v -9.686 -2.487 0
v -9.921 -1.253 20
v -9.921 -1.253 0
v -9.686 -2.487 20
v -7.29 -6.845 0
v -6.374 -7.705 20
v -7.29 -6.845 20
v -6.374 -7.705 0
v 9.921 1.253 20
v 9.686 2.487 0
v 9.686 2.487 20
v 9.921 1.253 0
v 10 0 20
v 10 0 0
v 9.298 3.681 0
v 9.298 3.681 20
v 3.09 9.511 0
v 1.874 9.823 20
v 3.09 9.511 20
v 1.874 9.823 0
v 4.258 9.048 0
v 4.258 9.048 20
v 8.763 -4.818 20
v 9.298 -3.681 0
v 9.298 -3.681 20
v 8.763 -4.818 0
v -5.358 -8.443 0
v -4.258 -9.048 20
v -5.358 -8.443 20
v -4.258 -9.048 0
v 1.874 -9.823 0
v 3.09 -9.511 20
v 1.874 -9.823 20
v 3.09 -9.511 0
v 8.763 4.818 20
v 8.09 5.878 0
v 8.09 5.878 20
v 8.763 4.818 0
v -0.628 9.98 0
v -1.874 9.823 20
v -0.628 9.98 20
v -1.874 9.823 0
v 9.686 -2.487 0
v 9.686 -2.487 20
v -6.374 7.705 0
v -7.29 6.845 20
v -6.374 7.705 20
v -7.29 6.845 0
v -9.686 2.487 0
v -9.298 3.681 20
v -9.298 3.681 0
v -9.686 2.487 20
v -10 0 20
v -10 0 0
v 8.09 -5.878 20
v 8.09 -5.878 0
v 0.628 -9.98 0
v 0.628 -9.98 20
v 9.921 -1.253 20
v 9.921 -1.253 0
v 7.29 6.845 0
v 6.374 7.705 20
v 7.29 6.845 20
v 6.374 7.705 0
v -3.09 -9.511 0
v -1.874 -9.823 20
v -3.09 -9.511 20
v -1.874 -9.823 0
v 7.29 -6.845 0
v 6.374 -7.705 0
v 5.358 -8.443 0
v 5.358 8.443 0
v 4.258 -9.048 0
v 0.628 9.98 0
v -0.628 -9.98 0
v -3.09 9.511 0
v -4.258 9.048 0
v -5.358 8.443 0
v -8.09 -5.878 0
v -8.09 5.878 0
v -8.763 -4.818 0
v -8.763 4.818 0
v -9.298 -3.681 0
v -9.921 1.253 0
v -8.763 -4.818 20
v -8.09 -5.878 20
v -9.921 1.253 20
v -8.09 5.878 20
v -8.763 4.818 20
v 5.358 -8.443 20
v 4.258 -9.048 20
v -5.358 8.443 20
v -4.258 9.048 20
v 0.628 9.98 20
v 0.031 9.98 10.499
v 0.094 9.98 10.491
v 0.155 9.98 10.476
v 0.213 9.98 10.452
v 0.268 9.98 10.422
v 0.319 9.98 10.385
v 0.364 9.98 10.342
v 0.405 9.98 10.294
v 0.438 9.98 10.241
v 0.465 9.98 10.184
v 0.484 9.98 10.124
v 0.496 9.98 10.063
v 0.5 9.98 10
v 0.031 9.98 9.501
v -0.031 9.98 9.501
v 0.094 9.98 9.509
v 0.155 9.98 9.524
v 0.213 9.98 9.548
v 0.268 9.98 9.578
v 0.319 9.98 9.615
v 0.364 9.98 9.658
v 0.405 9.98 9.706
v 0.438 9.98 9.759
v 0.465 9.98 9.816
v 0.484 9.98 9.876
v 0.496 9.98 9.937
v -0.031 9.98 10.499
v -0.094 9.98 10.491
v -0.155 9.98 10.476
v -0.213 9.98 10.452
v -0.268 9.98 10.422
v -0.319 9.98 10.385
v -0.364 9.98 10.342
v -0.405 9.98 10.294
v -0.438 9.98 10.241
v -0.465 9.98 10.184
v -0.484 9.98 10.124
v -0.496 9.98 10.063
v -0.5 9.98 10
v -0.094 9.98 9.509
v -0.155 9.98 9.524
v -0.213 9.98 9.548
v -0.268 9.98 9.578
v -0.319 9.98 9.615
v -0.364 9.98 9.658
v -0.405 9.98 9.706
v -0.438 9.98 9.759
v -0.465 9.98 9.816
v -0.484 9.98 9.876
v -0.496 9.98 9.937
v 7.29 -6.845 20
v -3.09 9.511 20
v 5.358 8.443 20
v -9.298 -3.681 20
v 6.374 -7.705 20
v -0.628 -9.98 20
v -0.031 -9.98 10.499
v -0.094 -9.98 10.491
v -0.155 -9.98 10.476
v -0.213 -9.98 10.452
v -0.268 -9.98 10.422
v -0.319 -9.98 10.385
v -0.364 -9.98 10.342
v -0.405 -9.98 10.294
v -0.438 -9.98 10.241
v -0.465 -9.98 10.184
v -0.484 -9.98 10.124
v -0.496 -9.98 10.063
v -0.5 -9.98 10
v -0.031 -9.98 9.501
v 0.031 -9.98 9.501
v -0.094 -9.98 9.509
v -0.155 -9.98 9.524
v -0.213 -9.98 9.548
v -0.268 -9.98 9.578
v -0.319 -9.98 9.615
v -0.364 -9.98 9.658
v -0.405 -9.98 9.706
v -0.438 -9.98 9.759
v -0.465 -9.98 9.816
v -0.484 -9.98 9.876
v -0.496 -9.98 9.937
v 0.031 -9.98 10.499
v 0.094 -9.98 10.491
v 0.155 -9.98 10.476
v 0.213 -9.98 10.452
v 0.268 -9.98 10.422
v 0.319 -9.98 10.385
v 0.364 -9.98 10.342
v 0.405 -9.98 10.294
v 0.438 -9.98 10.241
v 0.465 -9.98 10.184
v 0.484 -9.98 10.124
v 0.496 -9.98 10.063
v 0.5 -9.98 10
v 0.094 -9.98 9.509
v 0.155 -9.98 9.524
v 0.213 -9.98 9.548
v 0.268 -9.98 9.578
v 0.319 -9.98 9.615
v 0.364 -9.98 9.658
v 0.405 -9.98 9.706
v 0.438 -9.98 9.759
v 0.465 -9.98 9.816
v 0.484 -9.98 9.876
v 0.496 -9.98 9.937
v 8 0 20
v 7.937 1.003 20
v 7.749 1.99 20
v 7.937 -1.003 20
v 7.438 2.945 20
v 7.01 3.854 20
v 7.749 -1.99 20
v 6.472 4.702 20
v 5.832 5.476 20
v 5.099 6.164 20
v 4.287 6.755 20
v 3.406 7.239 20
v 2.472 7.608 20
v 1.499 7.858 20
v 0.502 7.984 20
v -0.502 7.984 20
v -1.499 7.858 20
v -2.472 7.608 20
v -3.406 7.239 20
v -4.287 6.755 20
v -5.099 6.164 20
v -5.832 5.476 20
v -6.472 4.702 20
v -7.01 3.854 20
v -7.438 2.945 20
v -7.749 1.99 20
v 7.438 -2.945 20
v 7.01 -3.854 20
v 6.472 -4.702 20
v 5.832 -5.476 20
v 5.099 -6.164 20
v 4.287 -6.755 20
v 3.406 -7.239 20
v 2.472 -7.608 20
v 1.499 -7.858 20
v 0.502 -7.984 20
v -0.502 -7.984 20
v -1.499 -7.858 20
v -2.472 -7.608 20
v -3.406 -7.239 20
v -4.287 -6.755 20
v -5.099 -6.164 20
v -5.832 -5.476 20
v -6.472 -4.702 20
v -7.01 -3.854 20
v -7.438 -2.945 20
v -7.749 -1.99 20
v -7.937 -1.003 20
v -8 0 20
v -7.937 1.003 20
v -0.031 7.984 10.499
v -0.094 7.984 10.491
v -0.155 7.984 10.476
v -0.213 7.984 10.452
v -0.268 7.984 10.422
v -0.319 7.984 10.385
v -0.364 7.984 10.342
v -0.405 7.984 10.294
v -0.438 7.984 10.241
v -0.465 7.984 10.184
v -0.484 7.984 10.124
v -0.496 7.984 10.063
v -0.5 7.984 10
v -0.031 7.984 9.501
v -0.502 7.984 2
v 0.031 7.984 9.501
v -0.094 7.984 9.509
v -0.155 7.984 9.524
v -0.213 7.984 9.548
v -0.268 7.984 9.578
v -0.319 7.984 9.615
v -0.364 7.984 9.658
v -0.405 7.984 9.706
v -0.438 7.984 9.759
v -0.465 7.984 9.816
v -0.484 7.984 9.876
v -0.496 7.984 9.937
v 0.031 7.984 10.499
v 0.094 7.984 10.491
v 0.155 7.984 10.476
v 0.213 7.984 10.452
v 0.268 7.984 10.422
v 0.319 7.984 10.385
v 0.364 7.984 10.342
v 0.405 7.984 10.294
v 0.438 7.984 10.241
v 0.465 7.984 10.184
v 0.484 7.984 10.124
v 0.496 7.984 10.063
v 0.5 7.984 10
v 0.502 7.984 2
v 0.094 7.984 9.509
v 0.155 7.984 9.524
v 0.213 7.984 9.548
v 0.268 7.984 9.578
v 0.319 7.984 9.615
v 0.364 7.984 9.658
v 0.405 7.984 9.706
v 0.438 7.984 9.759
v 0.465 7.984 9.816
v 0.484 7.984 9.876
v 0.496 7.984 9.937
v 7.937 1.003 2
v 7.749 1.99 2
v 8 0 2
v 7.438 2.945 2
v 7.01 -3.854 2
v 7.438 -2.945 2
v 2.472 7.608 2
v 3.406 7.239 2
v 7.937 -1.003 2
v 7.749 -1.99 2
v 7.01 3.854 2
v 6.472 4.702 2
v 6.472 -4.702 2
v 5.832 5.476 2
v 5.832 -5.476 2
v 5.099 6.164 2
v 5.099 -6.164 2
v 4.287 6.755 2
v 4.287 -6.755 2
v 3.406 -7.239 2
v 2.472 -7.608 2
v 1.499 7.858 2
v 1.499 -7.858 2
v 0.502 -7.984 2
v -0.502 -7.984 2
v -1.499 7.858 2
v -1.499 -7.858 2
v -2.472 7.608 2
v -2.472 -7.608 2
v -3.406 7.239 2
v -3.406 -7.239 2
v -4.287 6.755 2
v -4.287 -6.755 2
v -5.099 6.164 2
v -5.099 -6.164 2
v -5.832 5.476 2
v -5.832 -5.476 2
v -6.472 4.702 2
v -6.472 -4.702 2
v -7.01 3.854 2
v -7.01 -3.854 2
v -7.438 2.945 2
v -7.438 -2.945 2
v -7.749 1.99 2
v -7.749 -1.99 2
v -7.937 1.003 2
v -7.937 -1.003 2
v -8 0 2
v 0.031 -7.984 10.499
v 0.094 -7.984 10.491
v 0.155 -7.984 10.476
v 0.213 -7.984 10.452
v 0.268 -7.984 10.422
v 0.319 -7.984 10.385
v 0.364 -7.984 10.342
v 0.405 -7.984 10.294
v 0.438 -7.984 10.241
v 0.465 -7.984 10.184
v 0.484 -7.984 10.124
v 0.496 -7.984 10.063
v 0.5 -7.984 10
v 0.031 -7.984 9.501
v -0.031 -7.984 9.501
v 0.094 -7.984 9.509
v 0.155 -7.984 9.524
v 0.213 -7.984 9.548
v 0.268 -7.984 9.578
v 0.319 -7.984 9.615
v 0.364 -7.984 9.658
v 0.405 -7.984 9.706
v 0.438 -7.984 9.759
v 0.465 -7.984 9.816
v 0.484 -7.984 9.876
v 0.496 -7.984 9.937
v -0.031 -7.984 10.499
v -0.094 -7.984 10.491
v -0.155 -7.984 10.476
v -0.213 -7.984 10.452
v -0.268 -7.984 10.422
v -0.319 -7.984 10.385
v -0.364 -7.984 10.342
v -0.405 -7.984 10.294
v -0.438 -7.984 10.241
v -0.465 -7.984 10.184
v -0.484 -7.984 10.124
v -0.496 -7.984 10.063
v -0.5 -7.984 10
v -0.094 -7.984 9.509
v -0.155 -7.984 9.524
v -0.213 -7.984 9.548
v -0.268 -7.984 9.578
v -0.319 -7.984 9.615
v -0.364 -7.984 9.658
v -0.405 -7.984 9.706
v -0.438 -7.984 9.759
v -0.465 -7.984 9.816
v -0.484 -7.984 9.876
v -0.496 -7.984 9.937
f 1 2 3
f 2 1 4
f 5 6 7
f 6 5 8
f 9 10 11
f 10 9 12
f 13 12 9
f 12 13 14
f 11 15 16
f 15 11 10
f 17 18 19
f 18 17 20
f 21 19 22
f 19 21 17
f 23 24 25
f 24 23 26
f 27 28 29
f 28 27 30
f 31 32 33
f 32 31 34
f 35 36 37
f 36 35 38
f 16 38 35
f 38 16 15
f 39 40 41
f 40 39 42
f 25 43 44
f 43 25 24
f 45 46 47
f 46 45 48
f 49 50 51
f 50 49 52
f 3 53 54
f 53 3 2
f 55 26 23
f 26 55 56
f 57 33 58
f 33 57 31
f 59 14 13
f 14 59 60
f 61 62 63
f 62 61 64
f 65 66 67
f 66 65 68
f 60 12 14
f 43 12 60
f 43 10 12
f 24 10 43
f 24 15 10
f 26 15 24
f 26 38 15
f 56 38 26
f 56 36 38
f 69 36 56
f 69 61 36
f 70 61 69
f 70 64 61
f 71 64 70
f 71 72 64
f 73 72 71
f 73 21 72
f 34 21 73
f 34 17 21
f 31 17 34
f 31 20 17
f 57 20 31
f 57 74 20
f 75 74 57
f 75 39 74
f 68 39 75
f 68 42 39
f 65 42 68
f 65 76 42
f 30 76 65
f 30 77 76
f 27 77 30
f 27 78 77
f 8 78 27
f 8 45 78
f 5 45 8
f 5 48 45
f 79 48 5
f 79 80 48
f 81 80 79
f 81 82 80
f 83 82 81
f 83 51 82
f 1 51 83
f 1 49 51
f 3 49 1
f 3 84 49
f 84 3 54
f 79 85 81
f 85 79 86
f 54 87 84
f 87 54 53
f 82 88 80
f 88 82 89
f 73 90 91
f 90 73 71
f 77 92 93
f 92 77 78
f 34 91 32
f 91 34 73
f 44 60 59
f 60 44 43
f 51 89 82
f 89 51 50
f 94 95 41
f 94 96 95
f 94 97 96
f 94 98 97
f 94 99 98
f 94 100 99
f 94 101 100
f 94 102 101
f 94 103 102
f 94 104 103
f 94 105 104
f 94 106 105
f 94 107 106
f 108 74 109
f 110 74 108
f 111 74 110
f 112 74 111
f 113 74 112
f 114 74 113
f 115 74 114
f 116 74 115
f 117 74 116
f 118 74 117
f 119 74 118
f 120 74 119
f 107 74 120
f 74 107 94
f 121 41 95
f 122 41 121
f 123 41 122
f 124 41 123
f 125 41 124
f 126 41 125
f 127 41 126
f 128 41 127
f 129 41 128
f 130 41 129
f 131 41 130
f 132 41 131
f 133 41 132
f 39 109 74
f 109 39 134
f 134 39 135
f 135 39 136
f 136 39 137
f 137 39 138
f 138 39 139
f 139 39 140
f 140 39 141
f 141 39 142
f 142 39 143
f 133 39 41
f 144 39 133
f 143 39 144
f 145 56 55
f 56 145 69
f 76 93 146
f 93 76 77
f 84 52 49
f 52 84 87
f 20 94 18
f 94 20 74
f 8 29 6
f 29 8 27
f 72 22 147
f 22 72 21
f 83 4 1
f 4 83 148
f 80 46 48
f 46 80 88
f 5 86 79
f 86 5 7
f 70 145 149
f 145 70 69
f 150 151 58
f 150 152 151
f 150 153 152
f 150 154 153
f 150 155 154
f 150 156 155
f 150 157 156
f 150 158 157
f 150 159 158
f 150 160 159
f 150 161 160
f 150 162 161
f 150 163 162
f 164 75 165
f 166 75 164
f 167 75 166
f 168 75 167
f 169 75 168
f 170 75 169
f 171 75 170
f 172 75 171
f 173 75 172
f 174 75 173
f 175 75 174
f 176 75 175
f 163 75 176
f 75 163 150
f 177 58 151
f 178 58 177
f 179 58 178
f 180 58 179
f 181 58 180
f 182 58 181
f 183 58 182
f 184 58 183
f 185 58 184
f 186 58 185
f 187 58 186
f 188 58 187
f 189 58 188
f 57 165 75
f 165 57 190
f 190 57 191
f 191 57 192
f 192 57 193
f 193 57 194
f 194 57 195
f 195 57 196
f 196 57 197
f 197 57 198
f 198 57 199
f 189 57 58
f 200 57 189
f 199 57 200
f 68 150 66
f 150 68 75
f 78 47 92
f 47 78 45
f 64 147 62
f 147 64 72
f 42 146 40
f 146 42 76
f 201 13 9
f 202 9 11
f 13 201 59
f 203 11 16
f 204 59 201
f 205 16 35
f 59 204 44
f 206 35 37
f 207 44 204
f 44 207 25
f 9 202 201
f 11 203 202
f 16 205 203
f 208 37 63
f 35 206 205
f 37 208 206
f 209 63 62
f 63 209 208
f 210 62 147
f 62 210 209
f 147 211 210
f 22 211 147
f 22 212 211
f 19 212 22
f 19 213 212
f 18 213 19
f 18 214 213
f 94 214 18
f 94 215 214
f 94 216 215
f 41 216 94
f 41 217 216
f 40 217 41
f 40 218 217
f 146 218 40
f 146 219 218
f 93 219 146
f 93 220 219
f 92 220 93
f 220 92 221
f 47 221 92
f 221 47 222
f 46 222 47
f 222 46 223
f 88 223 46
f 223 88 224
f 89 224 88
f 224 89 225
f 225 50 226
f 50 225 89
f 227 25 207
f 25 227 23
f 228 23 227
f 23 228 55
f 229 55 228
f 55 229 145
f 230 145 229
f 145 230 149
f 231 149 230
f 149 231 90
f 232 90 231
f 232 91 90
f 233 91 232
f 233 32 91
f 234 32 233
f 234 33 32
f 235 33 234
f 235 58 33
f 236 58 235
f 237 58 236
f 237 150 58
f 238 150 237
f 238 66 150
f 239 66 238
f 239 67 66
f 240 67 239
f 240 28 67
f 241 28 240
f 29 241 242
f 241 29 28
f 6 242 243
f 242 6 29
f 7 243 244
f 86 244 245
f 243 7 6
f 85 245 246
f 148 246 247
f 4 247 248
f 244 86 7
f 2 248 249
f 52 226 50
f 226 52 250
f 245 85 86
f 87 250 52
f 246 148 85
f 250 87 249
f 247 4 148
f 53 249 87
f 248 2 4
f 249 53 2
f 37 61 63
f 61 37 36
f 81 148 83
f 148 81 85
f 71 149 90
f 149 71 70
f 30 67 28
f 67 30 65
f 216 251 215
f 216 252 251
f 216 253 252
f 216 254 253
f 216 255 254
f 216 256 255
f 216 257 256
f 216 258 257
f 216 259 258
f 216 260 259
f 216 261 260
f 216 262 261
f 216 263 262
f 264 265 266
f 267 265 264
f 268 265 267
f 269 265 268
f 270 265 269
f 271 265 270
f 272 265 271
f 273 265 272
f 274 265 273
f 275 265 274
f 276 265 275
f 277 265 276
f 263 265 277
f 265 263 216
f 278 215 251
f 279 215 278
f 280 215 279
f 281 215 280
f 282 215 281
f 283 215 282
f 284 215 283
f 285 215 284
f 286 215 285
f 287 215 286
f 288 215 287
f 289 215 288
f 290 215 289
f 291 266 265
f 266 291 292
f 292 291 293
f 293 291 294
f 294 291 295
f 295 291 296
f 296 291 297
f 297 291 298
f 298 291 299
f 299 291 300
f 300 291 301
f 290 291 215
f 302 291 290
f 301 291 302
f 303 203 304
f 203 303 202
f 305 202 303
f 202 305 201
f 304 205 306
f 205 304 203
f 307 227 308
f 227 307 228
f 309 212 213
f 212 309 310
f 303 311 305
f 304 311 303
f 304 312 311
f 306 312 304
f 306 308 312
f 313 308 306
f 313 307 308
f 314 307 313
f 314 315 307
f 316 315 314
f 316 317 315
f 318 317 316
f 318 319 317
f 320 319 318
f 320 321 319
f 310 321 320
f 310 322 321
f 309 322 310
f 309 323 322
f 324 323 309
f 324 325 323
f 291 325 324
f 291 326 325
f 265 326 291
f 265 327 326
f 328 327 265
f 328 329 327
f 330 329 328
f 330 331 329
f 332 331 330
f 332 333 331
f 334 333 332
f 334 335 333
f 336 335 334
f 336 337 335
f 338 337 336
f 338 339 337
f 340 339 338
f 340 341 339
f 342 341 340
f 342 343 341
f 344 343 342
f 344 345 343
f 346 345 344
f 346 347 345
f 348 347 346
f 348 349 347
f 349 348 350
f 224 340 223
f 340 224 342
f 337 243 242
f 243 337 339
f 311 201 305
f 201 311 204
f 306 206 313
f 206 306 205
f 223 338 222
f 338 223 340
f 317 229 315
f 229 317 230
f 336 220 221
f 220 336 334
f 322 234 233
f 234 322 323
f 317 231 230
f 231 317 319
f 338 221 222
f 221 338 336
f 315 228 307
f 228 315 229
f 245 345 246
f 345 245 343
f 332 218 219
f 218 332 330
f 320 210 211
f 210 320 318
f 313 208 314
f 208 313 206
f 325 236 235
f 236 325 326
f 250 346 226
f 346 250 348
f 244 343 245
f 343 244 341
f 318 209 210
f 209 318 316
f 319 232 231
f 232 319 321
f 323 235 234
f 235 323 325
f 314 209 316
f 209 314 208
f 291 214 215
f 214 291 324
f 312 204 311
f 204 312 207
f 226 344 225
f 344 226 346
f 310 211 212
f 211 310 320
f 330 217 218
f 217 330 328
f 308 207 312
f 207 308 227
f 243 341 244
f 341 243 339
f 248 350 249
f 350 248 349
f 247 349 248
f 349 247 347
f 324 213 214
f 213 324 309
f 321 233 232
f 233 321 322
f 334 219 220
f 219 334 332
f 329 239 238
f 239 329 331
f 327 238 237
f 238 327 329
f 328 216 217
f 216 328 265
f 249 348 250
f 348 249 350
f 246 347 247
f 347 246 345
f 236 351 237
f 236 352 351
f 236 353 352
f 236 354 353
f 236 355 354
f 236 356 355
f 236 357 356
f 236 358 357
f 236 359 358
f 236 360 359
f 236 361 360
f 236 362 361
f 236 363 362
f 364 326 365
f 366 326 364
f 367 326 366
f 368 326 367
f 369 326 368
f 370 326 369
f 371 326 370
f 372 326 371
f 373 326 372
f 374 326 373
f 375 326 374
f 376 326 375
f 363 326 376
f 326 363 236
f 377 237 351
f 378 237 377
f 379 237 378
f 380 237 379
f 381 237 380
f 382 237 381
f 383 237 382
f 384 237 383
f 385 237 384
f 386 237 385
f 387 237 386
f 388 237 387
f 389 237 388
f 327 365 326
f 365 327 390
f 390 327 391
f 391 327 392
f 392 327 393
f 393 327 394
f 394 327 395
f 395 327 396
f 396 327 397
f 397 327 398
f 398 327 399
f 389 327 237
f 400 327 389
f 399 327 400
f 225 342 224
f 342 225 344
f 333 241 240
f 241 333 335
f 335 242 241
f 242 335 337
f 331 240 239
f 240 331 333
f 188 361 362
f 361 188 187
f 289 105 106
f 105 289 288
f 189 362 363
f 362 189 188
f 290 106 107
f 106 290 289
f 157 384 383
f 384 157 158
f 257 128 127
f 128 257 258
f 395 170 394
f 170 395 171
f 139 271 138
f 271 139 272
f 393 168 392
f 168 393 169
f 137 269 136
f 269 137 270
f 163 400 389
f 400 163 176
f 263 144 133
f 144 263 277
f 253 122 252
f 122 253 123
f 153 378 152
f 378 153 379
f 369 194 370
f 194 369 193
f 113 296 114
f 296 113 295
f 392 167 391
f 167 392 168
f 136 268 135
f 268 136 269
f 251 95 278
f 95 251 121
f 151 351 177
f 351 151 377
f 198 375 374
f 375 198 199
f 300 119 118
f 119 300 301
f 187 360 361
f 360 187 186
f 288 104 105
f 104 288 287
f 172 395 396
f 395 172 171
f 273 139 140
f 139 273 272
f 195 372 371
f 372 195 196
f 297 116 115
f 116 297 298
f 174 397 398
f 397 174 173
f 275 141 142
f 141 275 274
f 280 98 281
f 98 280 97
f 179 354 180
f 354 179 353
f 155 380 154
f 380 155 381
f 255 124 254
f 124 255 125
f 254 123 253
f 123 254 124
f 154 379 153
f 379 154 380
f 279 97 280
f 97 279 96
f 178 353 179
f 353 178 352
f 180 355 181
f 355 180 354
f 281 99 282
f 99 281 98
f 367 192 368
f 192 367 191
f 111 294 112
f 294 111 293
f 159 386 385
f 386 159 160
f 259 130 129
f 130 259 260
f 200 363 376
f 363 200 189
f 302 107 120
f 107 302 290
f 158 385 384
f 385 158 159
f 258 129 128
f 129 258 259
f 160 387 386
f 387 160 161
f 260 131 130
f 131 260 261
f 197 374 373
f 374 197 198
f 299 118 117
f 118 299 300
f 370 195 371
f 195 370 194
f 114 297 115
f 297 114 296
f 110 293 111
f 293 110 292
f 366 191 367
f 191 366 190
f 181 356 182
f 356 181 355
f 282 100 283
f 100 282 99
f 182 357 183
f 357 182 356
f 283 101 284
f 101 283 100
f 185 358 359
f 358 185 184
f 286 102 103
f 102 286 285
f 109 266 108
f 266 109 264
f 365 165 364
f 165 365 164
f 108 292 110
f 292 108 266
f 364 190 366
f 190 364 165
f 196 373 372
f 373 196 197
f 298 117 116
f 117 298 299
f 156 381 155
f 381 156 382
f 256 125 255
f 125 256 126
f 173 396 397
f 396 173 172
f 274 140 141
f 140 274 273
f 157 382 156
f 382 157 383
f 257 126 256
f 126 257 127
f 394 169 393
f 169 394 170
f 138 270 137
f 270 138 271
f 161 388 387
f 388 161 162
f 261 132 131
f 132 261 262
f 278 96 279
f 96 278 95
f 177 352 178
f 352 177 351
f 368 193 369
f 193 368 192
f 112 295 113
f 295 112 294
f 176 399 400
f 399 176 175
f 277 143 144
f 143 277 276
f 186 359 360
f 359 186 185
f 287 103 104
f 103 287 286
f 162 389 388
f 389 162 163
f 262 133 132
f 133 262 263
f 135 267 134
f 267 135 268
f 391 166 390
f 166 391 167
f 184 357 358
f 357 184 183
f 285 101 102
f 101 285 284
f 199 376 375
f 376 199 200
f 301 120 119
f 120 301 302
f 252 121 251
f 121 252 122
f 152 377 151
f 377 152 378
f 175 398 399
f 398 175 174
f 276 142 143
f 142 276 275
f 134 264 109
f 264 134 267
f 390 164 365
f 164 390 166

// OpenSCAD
//Test rig to see if wires can be laid down during a print in the hole, printed over and then heated to seal the hole
//The layer height must be equivalent to the hole diameter
cupout=10;
wallt=2;
holer=0.5;
cuph=20;
$fn=50;

difference(){
    cylinder(r=cupout, h=cuph);
    translate([0,0,wallt])cylinder(r=cupout-wallt, h=cuph);
    translate([0,cupout, cuph/2])rotate([90,0,0])cylinder(r=holer, h=2*cupout); //hole for wire
}
